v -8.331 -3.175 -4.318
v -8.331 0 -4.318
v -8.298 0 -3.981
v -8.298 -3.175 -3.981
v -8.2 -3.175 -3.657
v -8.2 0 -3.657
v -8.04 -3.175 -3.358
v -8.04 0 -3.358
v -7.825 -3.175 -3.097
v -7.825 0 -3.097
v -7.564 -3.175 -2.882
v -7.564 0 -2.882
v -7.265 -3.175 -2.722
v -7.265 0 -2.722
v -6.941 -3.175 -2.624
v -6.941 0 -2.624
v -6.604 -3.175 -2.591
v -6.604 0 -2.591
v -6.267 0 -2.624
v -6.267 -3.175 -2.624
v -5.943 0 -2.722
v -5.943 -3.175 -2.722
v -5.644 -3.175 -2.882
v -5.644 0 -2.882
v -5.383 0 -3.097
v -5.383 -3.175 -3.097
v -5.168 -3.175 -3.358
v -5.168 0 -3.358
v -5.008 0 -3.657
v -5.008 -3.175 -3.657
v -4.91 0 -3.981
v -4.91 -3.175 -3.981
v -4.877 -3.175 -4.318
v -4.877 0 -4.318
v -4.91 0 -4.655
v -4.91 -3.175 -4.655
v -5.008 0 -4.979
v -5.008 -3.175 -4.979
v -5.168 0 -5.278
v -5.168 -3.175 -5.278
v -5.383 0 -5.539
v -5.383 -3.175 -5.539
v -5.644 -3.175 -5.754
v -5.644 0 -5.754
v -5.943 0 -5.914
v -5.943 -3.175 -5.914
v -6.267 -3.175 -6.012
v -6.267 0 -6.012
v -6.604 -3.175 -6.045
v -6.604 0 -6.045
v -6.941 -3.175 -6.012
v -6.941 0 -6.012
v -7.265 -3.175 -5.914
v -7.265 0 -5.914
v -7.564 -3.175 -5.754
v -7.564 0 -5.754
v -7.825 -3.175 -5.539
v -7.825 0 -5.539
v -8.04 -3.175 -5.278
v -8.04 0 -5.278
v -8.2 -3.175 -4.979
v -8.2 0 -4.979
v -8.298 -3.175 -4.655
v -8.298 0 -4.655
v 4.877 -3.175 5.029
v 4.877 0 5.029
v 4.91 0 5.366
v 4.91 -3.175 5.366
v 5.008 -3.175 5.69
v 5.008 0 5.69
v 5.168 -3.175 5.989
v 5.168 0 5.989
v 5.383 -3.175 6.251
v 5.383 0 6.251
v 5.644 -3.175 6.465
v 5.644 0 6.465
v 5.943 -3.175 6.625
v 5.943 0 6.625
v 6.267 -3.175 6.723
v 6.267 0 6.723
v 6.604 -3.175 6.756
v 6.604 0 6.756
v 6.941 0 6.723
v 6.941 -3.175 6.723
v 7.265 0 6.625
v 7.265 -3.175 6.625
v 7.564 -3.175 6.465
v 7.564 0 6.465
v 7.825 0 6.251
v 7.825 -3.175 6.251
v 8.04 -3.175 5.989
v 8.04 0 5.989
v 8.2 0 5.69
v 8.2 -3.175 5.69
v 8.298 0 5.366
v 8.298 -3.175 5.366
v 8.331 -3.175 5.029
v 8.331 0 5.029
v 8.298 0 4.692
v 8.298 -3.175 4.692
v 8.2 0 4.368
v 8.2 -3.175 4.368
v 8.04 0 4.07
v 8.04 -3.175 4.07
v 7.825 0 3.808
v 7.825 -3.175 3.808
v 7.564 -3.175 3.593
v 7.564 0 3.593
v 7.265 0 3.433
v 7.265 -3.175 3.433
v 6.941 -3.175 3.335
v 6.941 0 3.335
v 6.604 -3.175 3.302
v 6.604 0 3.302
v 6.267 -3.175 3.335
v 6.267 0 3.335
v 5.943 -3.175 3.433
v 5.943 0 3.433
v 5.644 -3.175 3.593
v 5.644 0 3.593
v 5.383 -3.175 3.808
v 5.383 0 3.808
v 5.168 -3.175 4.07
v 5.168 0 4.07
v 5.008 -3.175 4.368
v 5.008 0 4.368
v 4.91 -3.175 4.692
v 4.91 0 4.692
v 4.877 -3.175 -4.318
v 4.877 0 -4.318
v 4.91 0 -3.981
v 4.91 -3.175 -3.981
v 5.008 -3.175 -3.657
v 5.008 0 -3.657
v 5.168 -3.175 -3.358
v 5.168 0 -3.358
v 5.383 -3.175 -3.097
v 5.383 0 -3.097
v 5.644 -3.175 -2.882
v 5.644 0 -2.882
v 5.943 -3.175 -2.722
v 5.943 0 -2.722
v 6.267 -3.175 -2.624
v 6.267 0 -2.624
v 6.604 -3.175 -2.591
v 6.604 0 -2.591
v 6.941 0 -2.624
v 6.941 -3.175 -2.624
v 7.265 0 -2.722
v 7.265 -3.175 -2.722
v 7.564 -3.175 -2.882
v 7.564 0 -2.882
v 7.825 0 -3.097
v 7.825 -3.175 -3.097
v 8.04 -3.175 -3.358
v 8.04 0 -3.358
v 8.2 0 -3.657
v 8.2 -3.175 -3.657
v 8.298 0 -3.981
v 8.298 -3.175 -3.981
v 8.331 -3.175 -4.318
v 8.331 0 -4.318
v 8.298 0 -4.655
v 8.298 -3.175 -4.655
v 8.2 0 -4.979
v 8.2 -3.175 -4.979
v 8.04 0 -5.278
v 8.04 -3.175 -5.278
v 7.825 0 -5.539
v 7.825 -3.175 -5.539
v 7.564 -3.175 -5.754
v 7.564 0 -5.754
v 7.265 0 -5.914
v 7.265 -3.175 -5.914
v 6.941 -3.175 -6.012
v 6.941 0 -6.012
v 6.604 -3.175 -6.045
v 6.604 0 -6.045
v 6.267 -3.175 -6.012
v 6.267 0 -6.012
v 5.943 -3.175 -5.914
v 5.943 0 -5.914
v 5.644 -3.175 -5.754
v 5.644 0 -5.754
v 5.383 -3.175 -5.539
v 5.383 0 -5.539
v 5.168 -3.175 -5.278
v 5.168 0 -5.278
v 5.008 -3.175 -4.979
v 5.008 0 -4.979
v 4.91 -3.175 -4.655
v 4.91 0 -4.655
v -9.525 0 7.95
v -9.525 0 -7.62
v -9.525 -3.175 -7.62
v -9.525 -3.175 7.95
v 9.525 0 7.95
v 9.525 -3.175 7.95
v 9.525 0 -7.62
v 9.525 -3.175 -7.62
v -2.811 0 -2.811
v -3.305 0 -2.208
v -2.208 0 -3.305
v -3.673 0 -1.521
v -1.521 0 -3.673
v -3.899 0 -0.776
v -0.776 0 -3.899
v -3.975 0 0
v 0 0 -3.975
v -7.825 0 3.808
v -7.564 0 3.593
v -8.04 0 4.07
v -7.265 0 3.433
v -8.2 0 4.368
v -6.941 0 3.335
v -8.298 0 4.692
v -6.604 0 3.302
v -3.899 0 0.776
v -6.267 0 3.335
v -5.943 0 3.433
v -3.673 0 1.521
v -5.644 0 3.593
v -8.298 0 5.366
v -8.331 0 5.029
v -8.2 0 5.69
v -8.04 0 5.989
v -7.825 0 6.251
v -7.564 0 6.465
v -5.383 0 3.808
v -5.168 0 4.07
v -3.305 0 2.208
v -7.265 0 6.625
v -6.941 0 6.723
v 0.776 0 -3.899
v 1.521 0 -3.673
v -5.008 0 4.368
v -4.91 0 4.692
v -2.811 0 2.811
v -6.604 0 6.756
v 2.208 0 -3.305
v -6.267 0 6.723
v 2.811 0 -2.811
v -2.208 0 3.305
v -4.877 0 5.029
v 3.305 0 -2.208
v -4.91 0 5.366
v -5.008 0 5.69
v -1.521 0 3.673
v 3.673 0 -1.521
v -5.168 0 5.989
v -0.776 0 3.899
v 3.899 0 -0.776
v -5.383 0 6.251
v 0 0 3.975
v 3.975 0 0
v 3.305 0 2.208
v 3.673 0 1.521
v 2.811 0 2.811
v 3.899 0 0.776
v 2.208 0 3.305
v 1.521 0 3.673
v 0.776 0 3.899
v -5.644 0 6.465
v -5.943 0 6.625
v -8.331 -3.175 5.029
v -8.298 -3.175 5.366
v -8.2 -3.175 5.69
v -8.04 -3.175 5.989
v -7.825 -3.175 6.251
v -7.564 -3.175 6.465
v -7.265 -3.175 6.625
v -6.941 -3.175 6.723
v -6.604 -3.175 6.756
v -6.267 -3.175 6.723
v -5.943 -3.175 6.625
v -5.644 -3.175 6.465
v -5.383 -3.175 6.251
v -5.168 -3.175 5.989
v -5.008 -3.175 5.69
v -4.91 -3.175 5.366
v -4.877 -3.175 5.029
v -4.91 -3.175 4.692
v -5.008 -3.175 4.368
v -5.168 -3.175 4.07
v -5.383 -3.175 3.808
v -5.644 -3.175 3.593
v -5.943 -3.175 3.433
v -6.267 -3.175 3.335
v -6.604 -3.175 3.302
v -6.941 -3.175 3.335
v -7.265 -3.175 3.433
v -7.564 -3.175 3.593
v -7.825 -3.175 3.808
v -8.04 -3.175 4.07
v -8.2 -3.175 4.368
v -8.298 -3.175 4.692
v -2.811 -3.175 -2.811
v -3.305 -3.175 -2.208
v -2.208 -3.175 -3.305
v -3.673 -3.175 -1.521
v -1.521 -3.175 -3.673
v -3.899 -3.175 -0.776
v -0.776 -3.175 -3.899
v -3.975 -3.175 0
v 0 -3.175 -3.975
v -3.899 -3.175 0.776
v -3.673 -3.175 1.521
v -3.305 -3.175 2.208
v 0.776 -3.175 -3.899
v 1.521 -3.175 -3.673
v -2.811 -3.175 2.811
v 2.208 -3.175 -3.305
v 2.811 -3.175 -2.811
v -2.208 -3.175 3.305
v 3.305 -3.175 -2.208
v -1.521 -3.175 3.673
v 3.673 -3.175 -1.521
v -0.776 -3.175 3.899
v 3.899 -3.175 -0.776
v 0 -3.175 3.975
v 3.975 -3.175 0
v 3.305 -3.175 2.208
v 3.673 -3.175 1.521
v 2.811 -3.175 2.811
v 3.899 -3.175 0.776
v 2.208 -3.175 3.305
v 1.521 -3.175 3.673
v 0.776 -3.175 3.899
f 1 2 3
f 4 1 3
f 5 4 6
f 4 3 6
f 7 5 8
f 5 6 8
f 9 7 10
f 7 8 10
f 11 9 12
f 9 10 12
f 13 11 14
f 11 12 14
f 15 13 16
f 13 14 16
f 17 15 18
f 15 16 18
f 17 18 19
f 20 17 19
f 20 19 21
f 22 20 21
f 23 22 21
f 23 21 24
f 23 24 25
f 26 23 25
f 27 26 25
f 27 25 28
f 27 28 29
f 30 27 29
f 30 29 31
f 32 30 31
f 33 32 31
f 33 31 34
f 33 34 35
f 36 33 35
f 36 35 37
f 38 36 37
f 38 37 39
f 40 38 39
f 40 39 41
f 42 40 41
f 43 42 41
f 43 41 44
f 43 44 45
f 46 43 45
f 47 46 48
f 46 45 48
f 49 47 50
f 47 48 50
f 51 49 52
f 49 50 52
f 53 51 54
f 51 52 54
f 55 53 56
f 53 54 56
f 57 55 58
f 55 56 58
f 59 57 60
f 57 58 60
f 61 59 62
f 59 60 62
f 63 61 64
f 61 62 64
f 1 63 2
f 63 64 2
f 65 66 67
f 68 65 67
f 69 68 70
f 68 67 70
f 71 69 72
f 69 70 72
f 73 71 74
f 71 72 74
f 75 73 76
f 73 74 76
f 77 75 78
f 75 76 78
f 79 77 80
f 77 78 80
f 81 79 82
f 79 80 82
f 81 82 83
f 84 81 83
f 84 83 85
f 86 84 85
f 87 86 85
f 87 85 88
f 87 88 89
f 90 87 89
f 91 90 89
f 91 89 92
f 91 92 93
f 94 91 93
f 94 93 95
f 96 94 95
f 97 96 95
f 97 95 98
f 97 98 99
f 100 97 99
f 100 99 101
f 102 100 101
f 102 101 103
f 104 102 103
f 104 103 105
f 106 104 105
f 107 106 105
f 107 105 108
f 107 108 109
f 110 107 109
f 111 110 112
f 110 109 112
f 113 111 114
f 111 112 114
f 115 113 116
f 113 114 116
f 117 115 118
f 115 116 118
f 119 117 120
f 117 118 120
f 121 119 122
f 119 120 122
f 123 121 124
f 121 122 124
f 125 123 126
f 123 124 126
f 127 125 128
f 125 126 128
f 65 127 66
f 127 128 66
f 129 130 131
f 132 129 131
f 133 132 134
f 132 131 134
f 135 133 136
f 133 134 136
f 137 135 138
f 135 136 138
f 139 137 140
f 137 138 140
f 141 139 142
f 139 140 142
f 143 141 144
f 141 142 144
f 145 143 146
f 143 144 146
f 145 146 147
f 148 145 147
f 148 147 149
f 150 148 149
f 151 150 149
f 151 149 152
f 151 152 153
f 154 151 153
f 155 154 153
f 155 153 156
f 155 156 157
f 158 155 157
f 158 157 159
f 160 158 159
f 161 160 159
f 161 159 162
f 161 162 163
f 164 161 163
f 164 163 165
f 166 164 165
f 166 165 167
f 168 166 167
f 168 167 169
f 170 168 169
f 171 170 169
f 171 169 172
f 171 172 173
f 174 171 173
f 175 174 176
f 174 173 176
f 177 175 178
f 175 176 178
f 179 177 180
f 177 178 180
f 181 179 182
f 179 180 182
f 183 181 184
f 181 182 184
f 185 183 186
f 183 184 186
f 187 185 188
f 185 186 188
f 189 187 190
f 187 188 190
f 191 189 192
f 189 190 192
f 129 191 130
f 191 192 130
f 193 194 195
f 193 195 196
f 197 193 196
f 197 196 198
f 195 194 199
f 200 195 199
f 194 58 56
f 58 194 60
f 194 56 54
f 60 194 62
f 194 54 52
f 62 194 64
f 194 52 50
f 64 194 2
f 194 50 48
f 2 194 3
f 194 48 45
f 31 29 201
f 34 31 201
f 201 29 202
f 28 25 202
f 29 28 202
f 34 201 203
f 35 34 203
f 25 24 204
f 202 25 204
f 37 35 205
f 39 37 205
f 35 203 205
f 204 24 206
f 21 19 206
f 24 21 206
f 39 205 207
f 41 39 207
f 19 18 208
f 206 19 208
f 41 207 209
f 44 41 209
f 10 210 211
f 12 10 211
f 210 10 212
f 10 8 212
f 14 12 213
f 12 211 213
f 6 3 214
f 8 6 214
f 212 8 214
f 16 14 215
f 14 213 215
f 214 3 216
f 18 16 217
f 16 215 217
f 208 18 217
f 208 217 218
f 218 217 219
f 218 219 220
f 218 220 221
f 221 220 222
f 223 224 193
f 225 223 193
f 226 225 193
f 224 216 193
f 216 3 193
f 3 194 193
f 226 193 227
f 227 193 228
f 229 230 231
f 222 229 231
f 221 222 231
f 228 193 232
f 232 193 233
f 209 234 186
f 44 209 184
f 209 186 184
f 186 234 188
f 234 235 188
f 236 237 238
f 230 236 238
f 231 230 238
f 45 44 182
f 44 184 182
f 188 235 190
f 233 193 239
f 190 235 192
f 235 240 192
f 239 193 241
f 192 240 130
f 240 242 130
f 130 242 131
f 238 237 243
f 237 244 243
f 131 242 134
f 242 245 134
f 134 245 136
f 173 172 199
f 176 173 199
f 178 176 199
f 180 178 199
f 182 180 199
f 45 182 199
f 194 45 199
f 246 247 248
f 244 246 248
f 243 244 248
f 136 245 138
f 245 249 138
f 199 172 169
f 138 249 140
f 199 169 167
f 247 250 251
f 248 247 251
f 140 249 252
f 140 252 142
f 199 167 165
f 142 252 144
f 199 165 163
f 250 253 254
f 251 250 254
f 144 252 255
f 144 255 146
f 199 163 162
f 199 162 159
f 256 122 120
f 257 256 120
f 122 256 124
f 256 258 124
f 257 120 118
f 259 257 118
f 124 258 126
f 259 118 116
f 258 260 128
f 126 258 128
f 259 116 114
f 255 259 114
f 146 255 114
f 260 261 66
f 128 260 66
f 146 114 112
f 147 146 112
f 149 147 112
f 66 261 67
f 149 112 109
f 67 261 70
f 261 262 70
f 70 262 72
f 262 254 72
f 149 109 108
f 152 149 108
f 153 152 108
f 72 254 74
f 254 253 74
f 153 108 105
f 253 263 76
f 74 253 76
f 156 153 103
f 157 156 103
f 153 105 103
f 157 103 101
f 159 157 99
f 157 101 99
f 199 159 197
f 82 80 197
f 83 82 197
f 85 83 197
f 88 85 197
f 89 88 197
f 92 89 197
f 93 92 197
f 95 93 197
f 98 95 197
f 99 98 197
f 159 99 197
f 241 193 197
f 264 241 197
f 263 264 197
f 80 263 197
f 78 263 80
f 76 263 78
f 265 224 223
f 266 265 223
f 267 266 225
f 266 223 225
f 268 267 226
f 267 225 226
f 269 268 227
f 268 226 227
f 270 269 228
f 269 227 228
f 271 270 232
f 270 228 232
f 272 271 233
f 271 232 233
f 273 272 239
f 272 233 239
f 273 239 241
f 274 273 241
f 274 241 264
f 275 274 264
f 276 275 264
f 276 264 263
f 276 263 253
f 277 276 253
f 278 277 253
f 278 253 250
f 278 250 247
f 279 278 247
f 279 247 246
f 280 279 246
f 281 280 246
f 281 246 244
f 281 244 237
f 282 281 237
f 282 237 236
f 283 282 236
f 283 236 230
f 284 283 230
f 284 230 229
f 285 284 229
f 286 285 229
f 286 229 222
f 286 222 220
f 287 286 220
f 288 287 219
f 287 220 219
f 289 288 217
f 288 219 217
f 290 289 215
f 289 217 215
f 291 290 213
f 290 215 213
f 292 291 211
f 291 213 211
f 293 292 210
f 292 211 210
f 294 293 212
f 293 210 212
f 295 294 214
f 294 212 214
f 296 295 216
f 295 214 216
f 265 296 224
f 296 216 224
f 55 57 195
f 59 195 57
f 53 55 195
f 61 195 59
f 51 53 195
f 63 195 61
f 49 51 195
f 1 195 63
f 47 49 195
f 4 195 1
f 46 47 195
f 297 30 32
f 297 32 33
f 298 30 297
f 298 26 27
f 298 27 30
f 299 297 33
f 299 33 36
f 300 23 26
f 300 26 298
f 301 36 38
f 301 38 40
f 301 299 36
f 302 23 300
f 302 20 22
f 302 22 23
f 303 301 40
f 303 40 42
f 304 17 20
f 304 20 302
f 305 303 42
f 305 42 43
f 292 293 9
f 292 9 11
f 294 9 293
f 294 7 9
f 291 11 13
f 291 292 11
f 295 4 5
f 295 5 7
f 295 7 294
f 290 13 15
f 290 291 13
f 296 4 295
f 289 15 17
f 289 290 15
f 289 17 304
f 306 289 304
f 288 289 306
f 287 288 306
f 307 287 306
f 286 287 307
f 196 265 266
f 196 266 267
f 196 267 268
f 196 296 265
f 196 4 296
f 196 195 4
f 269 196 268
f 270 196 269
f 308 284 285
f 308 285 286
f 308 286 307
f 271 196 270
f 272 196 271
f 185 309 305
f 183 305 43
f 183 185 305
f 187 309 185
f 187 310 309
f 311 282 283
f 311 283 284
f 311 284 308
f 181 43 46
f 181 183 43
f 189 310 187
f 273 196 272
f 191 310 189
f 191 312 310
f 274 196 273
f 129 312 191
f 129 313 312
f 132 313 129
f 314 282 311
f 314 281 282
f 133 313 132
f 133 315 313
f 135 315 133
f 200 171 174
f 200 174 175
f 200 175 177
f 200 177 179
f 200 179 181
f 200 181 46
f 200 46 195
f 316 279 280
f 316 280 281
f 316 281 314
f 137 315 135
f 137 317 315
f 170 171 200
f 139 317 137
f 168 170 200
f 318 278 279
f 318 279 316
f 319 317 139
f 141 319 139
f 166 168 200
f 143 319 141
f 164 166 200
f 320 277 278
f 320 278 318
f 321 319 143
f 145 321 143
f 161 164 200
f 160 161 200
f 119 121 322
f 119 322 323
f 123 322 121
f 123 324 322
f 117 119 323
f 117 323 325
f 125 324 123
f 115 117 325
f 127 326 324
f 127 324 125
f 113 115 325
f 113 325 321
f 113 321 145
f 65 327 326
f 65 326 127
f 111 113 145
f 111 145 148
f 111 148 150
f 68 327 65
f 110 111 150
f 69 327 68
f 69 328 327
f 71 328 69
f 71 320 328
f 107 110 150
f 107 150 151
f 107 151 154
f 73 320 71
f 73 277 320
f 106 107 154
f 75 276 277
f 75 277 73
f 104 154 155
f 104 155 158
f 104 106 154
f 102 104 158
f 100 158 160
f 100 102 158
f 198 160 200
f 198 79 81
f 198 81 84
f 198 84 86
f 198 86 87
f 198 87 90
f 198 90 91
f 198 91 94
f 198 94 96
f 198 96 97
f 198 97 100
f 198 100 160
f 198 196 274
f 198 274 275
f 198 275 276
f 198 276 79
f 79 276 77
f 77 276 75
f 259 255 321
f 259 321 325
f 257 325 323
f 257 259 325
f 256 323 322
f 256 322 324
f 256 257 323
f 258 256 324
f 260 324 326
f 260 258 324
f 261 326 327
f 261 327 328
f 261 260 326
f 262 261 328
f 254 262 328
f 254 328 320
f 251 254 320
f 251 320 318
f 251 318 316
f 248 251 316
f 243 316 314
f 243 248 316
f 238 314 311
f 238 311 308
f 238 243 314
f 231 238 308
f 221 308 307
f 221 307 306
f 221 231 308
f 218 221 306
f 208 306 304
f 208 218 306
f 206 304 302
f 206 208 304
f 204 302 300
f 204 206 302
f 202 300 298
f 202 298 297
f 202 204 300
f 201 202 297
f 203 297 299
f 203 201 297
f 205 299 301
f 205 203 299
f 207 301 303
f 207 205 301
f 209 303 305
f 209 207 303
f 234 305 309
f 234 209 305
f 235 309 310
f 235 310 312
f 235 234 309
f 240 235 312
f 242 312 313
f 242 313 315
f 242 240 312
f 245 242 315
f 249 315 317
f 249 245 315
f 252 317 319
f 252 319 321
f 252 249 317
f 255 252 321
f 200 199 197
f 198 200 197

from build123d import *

# Parameters (mm, degrees)
F0_W     = 19.05
F0_H     = 15.5702
F0_R     = 3.9751
F1_DEPTH = 3.175
F3_D     = 3.4544


with BuildPart() as f1:
    # F0 (on Front) → F1 (new body)
    with BuildSketch(Plane.XZ):
        with Locations((0, 0.1651)):
            Rectangle(F0_W, F0_H)
        Circle(F0_R, mode=Mode.SUBTRACT)
    extrude(amount=F1_DEPTH)

    # F3 (through all)
    with Locations(Plane.XZ.offset(3.175)):
        with Locations((-6.604, 5.0292), (6.604, 5.0292), (6.604, -4.318), (-6.604, -4.318)):
            Hole(F3_D / 2)


solid = f1.part
